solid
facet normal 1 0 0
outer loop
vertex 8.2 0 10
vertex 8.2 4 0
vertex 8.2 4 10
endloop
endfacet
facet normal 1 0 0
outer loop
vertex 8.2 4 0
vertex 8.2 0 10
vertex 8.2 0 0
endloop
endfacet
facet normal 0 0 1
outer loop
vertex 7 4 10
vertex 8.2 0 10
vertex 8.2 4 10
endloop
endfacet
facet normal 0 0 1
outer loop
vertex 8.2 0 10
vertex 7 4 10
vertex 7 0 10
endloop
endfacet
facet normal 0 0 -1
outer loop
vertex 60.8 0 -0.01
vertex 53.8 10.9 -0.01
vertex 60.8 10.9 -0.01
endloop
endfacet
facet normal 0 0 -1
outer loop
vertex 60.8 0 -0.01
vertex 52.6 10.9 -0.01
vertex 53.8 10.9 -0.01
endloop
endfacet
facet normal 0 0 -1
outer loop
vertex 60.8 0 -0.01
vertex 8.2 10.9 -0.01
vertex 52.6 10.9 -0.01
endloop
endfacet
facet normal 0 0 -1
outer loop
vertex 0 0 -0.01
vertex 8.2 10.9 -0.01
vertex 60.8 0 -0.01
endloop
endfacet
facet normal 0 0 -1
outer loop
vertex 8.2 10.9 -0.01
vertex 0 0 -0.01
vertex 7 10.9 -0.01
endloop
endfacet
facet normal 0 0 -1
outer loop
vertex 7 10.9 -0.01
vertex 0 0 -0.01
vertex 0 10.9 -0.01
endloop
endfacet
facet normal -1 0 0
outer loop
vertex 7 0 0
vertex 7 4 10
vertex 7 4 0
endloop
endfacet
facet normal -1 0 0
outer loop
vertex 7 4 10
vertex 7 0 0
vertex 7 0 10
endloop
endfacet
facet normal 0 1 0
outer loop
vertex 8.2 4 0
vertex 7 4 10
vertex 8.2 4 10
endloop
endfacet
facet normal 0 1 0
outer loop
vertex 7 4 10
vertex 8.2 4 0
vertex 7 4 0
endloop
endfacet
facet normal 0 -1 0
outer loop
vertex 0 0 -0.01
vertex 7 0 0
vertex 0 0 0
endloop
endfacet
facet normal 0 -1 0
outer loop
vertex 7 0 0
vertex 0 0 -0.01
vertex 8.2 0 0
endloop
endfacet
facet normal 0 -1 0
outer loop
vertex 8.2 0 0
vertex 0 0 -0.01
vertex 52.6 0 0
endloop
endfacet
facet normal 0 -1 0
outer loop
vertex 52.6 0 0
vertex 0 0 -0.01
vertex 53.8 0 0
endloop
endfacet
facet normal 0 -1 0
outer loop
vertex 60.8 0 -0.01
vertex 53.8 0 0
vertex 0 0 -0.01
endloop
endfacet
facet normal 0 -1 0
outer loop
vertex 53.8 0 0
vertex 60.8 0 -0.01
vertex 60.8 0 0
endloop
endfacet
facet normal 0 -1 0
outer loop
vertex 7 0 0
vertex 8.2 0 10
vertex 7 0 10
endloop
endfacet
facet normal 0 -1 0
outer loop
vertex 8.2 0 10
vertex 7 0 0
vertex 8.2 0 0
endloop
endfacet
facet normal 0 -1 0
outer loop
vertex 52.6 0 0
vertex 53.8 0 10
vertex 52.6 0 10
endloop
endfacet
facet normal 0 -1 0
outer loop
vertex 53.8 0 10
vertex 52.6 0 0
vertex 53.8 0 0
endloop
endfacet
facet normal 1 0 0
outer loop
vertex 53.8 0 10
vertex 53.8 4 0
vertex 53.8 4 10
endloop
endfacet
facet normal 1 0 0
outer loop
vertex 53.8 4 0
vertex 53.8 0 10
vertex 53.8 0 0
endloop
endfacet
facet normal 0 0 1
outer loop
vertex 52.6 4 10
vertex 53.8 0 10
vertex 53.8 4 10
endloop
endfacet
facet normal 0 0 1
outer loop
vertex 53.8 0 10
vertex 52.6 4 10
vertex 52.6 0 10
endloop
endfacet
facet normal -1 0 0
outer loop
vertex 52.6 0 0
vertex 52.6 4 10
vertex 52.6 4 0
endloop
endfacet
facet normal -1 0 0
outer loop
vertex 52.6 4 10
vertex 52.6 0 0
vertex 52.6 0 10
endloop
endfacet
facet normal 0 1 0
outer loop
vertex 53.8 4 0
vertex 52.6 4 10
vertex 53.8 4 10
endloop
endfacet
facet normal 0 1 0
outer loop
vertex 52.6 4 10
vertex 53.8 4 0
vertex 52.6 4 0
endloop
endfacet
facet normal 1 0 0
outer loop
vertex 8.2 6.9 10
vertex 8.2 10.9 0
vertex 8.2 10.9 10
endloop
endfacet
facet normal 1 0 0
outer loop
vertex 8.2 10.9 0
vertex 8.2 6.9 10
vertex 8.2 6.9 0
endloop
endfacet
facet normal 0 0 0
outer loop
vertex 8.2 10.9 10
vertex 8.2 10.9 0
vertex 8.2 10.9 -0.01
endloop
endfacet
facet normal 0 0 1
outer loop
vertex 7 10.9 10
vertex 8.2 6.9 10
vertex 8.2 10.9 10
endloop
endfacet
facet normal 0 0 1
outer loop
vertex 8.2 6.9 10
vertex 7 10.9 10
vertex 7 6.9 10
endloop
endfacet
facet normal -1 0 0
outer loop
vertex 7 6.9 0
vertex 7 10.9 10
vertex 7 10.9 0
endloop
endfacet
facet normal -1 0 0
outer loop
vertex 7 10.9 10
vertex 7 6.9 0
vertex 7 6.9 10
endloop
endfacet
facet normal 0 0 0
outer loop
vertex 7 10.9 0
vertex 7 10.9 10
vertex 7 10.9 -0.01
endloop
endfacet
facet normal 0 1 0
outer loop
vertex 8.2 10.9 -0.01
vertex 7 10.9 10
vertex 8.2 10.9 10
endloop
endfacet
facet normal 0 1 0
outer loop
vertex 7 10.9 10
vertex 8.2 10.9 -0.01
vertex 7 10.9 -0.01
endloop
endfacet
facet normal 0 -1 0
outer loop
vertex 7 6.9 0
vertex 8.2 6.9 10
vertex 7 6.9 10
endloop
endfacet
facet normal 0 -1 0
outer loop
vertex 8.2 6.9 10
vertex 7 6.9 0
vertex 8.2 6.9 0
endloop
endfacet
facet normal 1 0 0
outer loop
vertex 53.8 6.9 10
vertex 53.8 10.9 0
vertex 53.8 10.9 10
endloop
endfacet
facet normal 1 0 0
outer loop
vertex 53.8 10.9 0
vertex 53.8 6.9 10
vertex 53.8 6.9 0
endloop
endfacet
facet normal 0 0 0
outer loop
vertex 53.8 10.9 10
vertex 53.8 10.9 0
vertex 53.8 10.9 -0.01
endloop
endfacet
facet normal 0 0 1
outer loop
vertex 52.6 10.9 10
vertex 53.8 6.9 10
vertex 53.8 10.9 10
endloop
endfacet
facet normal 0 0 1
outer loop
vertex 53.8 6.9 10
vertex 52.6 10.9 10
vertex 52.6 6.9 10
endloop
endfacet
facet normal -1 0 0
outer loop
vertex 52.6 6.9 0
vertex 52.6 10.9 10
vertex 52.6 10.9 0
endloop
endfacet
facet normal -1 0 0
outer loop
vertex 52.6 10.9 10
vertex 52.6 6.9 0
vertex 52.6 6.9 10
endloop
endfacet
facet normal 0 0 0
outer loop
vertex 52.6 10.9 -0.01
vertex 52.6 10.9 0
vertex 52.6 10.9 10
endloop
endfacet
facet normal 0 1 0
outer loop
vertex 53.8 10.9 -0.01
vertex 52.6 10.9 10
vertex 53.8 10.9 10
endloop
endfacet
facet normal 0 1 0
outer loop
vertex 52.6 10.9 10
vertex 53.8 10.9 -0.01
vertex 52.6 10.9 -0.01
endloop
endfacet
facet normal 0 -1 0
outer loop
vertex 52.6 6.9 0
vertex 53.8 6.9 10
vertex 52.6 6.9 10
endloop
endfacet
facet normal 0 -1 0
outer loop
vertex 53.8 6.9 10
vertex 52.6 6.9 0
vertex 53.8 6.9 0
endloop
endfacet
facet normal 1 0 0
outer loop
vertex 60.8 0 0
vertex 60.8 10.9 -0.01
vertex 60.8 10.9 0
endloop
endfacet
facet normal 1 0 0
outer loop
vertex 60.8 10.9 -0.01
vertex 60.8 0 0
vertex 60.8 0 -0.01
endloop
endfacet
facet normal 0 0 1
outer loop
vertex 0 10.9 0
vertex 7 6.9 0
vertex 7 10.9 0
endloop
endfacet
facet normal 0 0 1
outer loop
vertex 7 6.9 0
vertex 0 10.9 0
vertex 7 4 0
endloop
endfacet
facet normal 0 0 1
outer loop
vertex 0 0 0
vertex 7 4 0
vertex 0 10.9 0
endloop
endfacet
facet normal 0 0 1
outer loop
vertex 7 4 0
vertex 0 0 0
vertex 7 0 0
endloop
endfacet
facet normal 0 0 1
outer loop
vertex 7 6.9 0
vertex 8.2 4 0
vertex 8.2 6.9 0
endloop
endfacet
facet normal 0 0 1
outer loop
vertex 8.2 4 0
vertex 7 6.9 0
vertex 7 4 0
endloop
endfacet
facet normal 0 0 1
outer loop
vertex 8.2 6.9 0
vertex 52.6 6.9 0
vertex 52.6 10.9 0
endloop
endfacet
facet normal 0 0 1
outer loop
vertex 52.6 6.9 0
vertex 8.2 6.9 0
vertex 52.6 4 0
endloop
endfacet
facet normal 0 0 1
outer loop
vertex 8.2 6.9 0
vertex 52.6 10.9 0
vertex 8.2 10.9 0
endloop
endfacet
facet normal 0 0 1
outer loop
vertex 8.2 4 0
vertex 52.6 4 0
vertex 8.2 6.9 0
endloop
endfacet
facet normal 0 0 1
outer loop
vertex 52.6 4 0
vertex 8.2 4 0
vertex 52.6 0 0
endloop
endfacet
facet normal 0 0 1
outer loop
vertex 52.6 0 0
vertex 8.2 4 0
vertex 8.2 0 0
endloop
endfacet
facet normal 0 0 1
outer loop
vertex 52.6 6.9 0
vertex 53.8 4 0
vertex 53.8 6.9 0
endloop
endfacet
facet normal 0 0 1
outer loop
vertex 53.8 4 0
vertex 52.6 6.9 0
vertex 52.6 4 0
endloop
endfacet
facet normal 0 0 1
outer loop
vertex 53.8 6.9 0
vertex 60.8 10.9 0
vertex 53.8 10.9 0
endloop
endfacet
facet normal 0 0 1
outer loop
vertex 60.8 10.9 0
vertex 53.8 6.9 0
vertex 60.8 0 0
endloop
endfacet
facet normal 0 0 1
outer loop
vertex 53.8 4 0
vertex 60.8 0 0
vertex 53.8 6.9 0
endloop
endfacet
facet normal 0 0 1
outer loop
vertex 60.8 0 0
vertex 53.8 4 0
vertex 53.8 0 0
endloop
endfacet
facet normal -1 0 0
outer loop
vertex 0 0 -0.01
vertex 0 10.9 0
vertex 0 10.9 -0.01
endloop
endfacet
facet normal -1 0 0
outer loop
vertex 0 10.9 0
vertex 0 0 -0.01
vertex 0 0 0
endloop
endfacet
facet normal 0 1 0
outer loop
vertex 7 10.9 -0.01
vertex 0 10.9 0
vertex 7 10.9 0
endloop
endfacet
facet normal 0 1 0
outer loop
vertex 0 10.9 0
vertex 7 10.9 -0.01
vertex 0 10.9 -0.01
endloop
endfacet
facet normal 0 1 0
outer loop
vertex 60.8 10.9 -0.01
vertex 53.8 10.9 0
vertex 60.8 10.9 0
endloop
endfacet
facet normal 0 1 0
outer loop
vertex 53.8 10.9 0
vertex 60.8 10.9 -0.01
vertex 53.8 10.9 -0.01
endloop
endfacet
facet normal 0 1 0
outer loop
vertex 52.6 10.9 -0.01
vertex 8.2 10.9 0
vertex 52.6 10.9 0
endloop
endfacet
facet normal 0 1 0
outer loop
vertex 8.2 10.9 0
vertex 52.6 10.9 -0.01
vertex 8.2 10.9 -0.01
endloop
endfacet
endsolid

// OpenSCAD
// file: ../Base/Boxes.scad
// Fischertechnik Box Foundation
// Pre-designed Boxes

use <Constants.scad>

include <PlacementOptions.scad>

box190Width = 190;
box190Depth = 130;
box130Width = 130;
box130Depth = 95;

// Values are from an original ec3 box
topBottomDifference = 1.5;
outerHeight = 40;
baseThickness = 1.8;
innerHeight = outerHeight - baseThickness;
stackExcess = 5.7;
radius = 3.5;
wallThickness = 1.5;
tolerance = 0.2;

boxWallThickness = wallThickness;
boxBaseThickness = baseThickness;
boxWebWidth = 3.0;

// getBoxWallThickness()
// Gets the wall thickness of a Fischertechnik Box
function getBoxWallThickness() = boxWallThickness;

// getBoxUsageHeight(height = 38.2)
// Gets the usable height of a Fischertechnik box
// height = Outer height of the box from the bottom to the upper edge.
function getBoxUsageHeight(height = outerHeight) = height - baseThickness - stackExcess;

// getBoxInnerHeight()
// Gets the inner height of a Fischertechnik box, including the stack excess
function getBoxInnerHeight() = innerHeight;

// getBoxBaseThickness()
// Gets the thickness of the Fischertechnik box base.
function getBoxBaseThickness() = boxBaseThickness;

// getBoxWebWidth()
// Gets the width of a box web
function getBoxWebWidth() = boxWebWidth;

// getBox190Space()
// Gets the usable inner space of a Box 190 as an x/y-list
function getBox190Space() = [
    box190Width - 2*getBoxWallThickness() - topBottomDifference, 
    box190Depth - 2*getBoxWallThickness() - topBottomDifference ];

// RoundedCornerPlate(width, depth, height, radius)
// Creates a body plate with rounded corners for a box. Used
// also to create the complete box with the hull module.
// width = Width of the plate
// depth = depth of the plate 
// height = thickness of the plate
// radius = radius of the rounded corner
module RoundedCornerPlate(width, depth, height, radius) {
    translate([radius, radius])
    hull() {
        w = width-2*radius;
        d = depth-2*radius;
        cube([w, d, height]);
        cylinder(height, r=radius, $fn=getFragments());
        translate([w, 0])
            cylinder(height, r=radius, $fn=getFragments());
        translate([w, d])
            cylinder(height, r=radius, $fn=getFragments());
        translate([0, d])
            cylinder(height, r=radius, $fn=getFragments());
    }
}

// BoxBase(width, depth)
// Creates an empty stackable Fischertechnik compatible box
// width = Outer width of the box (190, 130, ...)
// depth = Outer depth of the box (130, 95, ...)

module BoxBase(width, depth, height=outerHeight) {    
    thinPlate = 0.01;

    innerHeight = height - baseThickness;    
    
    module Body(tolerance=tolerance) {
        hull() {
            // Bottom with tolerance to fit into the original boxes when stacked
            translate([-wallThickness+tolerance, -wallThickness+tolerance, -baseThickness])
                RoundedCornerPlate(width-topBottomDifference-2*tolerance, depth-topBottomDifference-2*tolerance, thinPlate, radius);
            
            // Top
            translate([-wallThickness-topBottomDifference/2, -wallThickness-topBottomDifference/2, innerHeight-thinPlate])
                RoundedCornerPlate(width, depth, thinPlate, radius);
         }
    }

    module Cutoff() {
        hull() {
            coWidth = width - 2*wallThickness;
            coDepth = depth - 2*wallThickness;
            
            // Bottom
            RoundedCornerPlate(coWidth-topBottomDifference, coDepth-topBottomDifference, thinPlate, radius);

            // Top
            translate([-topBottomDifference/2, -topBottomDifference/2, innerHeight+thinPlate]) 
                RoundedCornerPlate(coWidth, coDepth, thinPlate, radius);
        }
    }
    
    difference() {        
        Body();
        Cutoff();
        stackOffset = innerHeight - stackExcess;
        translate([0, 0, stackOffset + baseThickness])
            Body(tolerance=0);
    }
}

// Creates the Fischertechnik empty box 130x190 mm and places it at position 0,0
// 190x130 are the outer sizes, the inner space is slightly smaller. Use getBox190Space() to get the inner sizes.
// The box is positioned that the usable inner space is at the 0,0,0 position.

module Box190() {
    BoxBase(box190Width, box190Depth);
}

// Gets the usable inner space of a Box 130 as an x/y-list
function getBox130Space() = [
    box130Width - 2*getBoxWallThickness() - topBottomDifference, 
    box130Depth - 2*getBoxWallThickness() - topBottomDifference ];

// Creates the Fischertechnik empty box 95x130 mm and places it at position 0,0
// 190x130 are the outer sizes, the inner space is slightly smaller. Use getBox190Space() to get the inner sizes.
// The box is positioned that the usable inner space is at the 0,0,0 position.

module Box130() {
    BoxBase(box130Width, box130Depth);
}

// Creates a web at the specified box walls
// corner 0 = LowerLeft, 1 = UpperLeft, 2 = UpperRight, 3 = LowerRight
// side 0 = LeftOfCorner, 1 = RightOfCorner
// distance = Distance in mm from the corner
// boxSpace = inner width and depth of the box (default: Box 190)
// webWidth = length of the web (default is 3 mms)
// webThickness = thickness of the web (default is 1 mm)
// height = Height of the web (standard is getBoxUsageHeight())
// sink = How much of the web is sunk into the wall

module BoxWeb(
    corner, 
    side, 
    distance, 
    boxSpace=getBox190Space(), 
    webWidth=getBoxWebWidth(), 
    webThickness=1.0, 
    height=getBoxUsageHeight(),
    sink = getBoxWallThickness()/2) {
    width = (corner % 2 == 0) ? 
            (side == LeftOfCorner ? webWidth : webThickness) :
            (side == LeftOfCorner ? webThickness : webWidth);

    depth = (corner % 2 == 0) ? 
            (side == RightOfCorner ? webWidth : webThickness) :
            (side == RightOfCorner ? webThickness : webWidth);
    
    xDiff = corner == LowerLeft ? 
                (side == LeftOfCorner ? -sink : distance) :
            (corner == UpperLeft ?                
                (side == LeftOfCorner ? distance : -sink) :
            (corner == UpperRight ?
                (side == LeftOfCorner ? boxSpace.x-webWidth+sink : boxSpace.x-distance-webThickness) :
                (side == LeftOfCorner ? boxSpace.x-distance-webThickness: boxSpace.x-webWidth+sink)));

    yDiff = corner == LowerLeft ? 
                (side == RightOfCorner ? -sink : distance) :
            (corner == UpperLeft ?
                (side == RightOfCorner ? boxSpace.y-distance-webThickness : boxSpace.y-webWidth+sink) :
            (corner == UpperRight ?
                (side == RightOfCorner ? boxSpace.y-webWidth+sink : boxSpace.y-distance-webThickness) :
                (side == RightOfCorner ? distance : -sink)));
    
    translate([xDiff, yDiff, -getExcess()])
        cube([width, depth, height + 2*getExcess()]);
}
// file: ../Base/Rotation.scad
// Fischertechnik Box Foundation
// Geometry Helpers Rotation

include <PlacementOptions.scad>

// getRotatedSpace(space, rotation=NoRotation)
// Rotates the space dependent on the specified rotation

function getRotatedSpace(space, rotation=NoRotation) = [
    (rotation == Rotate90 || rotation == Rotate270) ? space.y : space.x,
    (rotation == Rotate90 || rotation == Rotate270) ? space.x : space.y
];

// Rotates the given space around the fixed left lower corner
// space = the space the children needs as width/depth list [width,depth]
// rotation = 0 Rotate0 degrees, 1 Rotate90 degrees, 2 Rotate180 degrees, 3 Rotate270 degrees (equivalent to -90)

module RotateFix(space, rotation=NoRotation) {
    dy = (rotation == Rotate0 || rotation == Rotate270) ? 0 :
        (rotation == Rotate90) ? space.x :
        space.y;
    dx = (rotation < Rotate180) ? 0 :
        (rotation == Rotate180) ? space.x :
        space.y;
    
    translate([dx, dy, 0])
        rotate([0, 0, rotations[rotation]])
            children();
}
// file: ../Base/Alignment.scad
// Fischertechnik Box Foundation
// Geometry Helpers Alignment

include <PlacementOptions.scad>

// getAlignedX(elementWidth, spaceWidth, align=AlignRight, offset=0)
// Gets the aligned X offset of an element with the given
// width in the given space.
// elementWidth = The width of the element to positon
// spaceWidth = The space where the element should be aligned
// align = 0 AlignLeft, 1 AlignCenter, 2 AlignRight
// offset = an optional offset from the aligned position. When
// aligned left or centered, then positive values are in X direction.
// When aligned right then positive values are in negative X direction.

function getAlignedX(elementWidth, spaceWidth, align=AlignRight, offset=0) =
    (align == AlignLeft) ?
        offset :
        ((align == AlignCenter) ?
        (spaceWidth - elementWidth)/2 + offset :
        spaceWidth - offset - elementWidth);

// getAlignedY(elementDepth, spaceDepth, align=AlignTop, offset=0)
// Gets the aligned Y offset of an element with the given
// depth in the given space.
// elementDepth = The depth of the element to positon
// spaceDepth = The space where the element should be aligned
// align = 0 AlignBottom, 1 AlignCenter, 2 AlignTop
// offset = an optional offset from the aligned position. When
// aligned bottom or centered, then positive values are in Y direction.
// When aligned top then positive values are in negative Y direction.

function getAlignedY(elementDepth, spaceDepth, align=AlignTop, offset=0) =
    (align == AlignBottom) ?
        offset :
        ((align == AlignCenter) ?
        (spaceDepth - elementDepth)/2 + offset :
        spaceDepth - offset - elementDepth);
// file: ../Base/PlacementOptions.scad
// Fischertechnik Box Foundation
// Placement Options

// Alignment
NoAlign = 0;
AlignLeft = 1;
AlignBottom = 2;
AlignCenter = 3;
AlignRight = 4;
AlignTop = 5;

// Element rotation degree steps
rotations = [0, -90, -180, -270];

// Rotation
NoRotation = 0;
Rotate0 = 0;
Rotate90 = 1;
Rotate180 = 2;
Rotate270 = 3;

// Docking (seen from above)
NoDock = -1;
DockLeft = 0;
DockTop = 1;
DockRight = 2;
DockCorner = 2;
DockBottom = 3;

// Web corners
LowerLeft = 0;
UpperLeft = 1;
UpperRight = 2;
LowerRight = 3;

// Web position relative to corner
LeftOfCorner = 0;
RightOfCorner = 1;

// Rails direction
Horizontal = true;
Vertical = false;
// file: ../Base/Placement.scad
// Fischertechnik Box Foundation
// Geometry Helpers Placement

use <Constants.scad>
use <Alignment.scad>
use <Rotation.scad>
use <Boxes.scad>

include <PlacementOptions.scad>

// Place(x=0, y=0, elementSpace=[0,0], alignX=AlignLeft, alignY=AlignBottom, rotation=Rotate0, boxSpace=getBox190Space())
// Places the child at the specified position
// y = Y-Position. This is a relative position when an X aligment is specified.
// x = X-Position. This is a relative position when an Y aligment is specified.
// elementSpace = space of the element to be placed [x,y]
// alignX = -1=NoAlign, 0 AlignLeft, 1 AlignCenter, 3 AlignRight (elementSpace and boxSpace required!)
// alignY = -1=NoAlign, 2 AlignBottom, 1 AlignCenter, 4 AlignTop (elementSpace and boxSpace required!)
// rotation = 0 Rotate0 0 degrees, 1 Rotate90 90 degrees, 
// 2 Rotate180 180 degrees, 3 Rotate270 270 degrees (equivalent to -90)
// boxSpace = Inner space of the box where the placement occurs [x,y] - default is Box 190x130 inner space

module Place(x=0, y=0, elementSpace=[0,0], 
  alignX=AlignLeft, alignY=AlignBottom, 
  rotation=NoRotation, boxSpace=getBox190Space()) {

    module Position(x, y, space, rotation=Rotate0) {
        translate([x, y, 0])
            RotateFix(space, rotation)
                children();
    }

    space = getRotatedSpace(elementSpace, rotation);
    alignedX = getAlignedX(space.x, boxSpace.x, alignX, x);
    alignedY = getAlignedY(space.y, boxSpace.y, alignY, y);
    Position(alignedX, alignedY, elementSpace, rotation)
        children();
}

// Center(space=getBox130Space(), elementSpace=[0,0])
// space = Space where the children is centered. For cylinder use centered=true and no elementSpace.
// elementSpace = space of the element to be centered [x,y]

module Center(space=getBox190Space(), elementSpace=[0,0]) {
    Place(elementSpace=elementSpace, boxSpace=space, alignX=AlignCenter, alignY=AlignCenter)
        children();
}

// CenterHorizontal(width=0, y=0, offset=0, space=getBox130Space())
// width = Width of the element to be placed.
// y = Y position of the element
// offset = Offset from the center position (negative will be left of the center)
// space = Space where the element is placed

module CenterHorizontal(width=0, y=0, offset=0, space=getBox190Space()) {
    Place(x=offset, y=y, elementSpace=[width, 0], boxSpace=space, alignX=AlignCenter)
        children(0);
}

// CenterVertical(depth=0, x=0, offset=0, space=getBox130Space())
// depth = Depth of the element to be placed.
// x = X position of the element
// offset = Offset from the center position (negative will be down of the center)
// space = Space where the element is placed

module CenterVertical(depth=0, x=0, offset=0, space=getBox190Space()) {
    Place(x=x, y=offset, elementSpace=[0, depth], boxSpace=space, alignY=AlignCenter)
        children(0);
}

// getIsVertical(align)
// True if the specified alignment needs a vertical orientation for a divider (AlignRight, AlignLeft)

function getIsVertical(align) = (align == AlignRight || align == AlignLeft);

// getIsHorizontal(align)
// True if the specified alignment needs a horizontal orientation for a divider (AlignTop, AlignBottom)

function getIsHorizontal(align) = (align == AlignTop || align == AlignBottom);
// file: ../Base/Constants.scad
// Fischertechnik Box Foundation
// Constants

// Constant values necessary for multiple elements

// Base constants
dividerThickness = 1.2;
excess = 0.01;
fragments = 90;
tolerance = 0.8;

// Gets the thickness of a divider 
function getDividerThickness() = dividerThickness;

// Gets the excess that is used to merge walls into each other
function getExcess() = excess;

// Gets amount of fragments of a cylinder
function getFragments() = fragments;

// Gets the inner tolerance of a frame to each side
function getTolerance() = tolerance;


// Fischertechnik specific constants
axisDiameter = 4;
axisBottomDiameter = axisDiameter + 1;
axisTolerance = 0.2;
axisLockingLength = 8;

// Gets axis diameter of Fischertechnik axis
function getAxisDiameter() = axisDiameter;

// Gets axis diameter tolerance (subtracted for element axis)
function getAxisTolerance() = axisTolerance;

// Gets the axis diameter for standing axis
function getStandAxisDiameter() = getAxisDiameter() - getAxisTolerance();

// Gets axis bottom diameter for thicker part at the bottom
function getAxisBottomDiameter() = axisBottomDiameter;

// Gets the lengthh of the locking part of a locking axis
function getAxisLockingLength() = axisLockingLength;

pinHeight = 2.5;
pinTolerance = 0.2;

// gets the height of a connecting pin
function getPinHeight() = pinHeight;

// gets the connecting pin height tolerance
function getPinTolerance() = pinTolerance;

standardEdgeDistance = 2.5;
standardWebDistance = 11.5;
standardCornerLength = 15;

// gets the standard distance to the wall of the box for dockable frames with webs
function getStandardEdgeDistance() = standardEdgeDistance;

// gets the standard distance of each web to the corner of the dockable frame
function getStandardWebDistance() = standardWebDistance;

// gets the standard length of the corner walls of a dockable frame
function getStandardCornerLength() = standardCornerLength;

tubeWallFactor = 0.8;

// gets the wall thickness of a tube.
function getTubeWallThickness() = tubeWallFactor * getDividerThickness();

smallPartsFrameHeight = 20;

// gets the frame height for docked small parts boxes.
function getSmallPartsFrameHeight() = smallPartsFrameHeight;

hubRingDiameter = 19.5;
hubRingLevelDiameter = 21;

// gets the diameter of a tube matching the inner ring of a wheel
function getHubRingDiameter() = hubRingDiameter;

// gets the diameter of a hub tube with a thicker diameter
function getHubRingLevelDiameter() = hubRingLevelDiameter;
// main file
// Fischertechnik Box Library
// Holder for Building Plate 30x45
// 38464

use <../ModelBase/Complex.scad>

/* [Element Parameters] */
count = 1;
dock = false;

/* [Hidden] */
width = 60;

// getHolderBuildingPlate15x60Space(count = 1)
// Gets the width (.x) and depth (.y) space the holder needs.

function getHolderBuildingPlate15x60Space(count = 1) = getHolderBuildingPlateSpace(width, count);

// HolderBuildingPlate15x60(count=1, dock=false)
// Holder for building plates 15x60
// count = Count of building plates (default 1)
// dock = true if the holders are docked to the box wall (default false) 

module HolderBuildingPlate15x60(count = 1, dock = false) {
    HolderBuildingPlate(width, count, dock);
}

// Test
color("lightgray")
HolderBuildingPlate15x60(count, dock);
